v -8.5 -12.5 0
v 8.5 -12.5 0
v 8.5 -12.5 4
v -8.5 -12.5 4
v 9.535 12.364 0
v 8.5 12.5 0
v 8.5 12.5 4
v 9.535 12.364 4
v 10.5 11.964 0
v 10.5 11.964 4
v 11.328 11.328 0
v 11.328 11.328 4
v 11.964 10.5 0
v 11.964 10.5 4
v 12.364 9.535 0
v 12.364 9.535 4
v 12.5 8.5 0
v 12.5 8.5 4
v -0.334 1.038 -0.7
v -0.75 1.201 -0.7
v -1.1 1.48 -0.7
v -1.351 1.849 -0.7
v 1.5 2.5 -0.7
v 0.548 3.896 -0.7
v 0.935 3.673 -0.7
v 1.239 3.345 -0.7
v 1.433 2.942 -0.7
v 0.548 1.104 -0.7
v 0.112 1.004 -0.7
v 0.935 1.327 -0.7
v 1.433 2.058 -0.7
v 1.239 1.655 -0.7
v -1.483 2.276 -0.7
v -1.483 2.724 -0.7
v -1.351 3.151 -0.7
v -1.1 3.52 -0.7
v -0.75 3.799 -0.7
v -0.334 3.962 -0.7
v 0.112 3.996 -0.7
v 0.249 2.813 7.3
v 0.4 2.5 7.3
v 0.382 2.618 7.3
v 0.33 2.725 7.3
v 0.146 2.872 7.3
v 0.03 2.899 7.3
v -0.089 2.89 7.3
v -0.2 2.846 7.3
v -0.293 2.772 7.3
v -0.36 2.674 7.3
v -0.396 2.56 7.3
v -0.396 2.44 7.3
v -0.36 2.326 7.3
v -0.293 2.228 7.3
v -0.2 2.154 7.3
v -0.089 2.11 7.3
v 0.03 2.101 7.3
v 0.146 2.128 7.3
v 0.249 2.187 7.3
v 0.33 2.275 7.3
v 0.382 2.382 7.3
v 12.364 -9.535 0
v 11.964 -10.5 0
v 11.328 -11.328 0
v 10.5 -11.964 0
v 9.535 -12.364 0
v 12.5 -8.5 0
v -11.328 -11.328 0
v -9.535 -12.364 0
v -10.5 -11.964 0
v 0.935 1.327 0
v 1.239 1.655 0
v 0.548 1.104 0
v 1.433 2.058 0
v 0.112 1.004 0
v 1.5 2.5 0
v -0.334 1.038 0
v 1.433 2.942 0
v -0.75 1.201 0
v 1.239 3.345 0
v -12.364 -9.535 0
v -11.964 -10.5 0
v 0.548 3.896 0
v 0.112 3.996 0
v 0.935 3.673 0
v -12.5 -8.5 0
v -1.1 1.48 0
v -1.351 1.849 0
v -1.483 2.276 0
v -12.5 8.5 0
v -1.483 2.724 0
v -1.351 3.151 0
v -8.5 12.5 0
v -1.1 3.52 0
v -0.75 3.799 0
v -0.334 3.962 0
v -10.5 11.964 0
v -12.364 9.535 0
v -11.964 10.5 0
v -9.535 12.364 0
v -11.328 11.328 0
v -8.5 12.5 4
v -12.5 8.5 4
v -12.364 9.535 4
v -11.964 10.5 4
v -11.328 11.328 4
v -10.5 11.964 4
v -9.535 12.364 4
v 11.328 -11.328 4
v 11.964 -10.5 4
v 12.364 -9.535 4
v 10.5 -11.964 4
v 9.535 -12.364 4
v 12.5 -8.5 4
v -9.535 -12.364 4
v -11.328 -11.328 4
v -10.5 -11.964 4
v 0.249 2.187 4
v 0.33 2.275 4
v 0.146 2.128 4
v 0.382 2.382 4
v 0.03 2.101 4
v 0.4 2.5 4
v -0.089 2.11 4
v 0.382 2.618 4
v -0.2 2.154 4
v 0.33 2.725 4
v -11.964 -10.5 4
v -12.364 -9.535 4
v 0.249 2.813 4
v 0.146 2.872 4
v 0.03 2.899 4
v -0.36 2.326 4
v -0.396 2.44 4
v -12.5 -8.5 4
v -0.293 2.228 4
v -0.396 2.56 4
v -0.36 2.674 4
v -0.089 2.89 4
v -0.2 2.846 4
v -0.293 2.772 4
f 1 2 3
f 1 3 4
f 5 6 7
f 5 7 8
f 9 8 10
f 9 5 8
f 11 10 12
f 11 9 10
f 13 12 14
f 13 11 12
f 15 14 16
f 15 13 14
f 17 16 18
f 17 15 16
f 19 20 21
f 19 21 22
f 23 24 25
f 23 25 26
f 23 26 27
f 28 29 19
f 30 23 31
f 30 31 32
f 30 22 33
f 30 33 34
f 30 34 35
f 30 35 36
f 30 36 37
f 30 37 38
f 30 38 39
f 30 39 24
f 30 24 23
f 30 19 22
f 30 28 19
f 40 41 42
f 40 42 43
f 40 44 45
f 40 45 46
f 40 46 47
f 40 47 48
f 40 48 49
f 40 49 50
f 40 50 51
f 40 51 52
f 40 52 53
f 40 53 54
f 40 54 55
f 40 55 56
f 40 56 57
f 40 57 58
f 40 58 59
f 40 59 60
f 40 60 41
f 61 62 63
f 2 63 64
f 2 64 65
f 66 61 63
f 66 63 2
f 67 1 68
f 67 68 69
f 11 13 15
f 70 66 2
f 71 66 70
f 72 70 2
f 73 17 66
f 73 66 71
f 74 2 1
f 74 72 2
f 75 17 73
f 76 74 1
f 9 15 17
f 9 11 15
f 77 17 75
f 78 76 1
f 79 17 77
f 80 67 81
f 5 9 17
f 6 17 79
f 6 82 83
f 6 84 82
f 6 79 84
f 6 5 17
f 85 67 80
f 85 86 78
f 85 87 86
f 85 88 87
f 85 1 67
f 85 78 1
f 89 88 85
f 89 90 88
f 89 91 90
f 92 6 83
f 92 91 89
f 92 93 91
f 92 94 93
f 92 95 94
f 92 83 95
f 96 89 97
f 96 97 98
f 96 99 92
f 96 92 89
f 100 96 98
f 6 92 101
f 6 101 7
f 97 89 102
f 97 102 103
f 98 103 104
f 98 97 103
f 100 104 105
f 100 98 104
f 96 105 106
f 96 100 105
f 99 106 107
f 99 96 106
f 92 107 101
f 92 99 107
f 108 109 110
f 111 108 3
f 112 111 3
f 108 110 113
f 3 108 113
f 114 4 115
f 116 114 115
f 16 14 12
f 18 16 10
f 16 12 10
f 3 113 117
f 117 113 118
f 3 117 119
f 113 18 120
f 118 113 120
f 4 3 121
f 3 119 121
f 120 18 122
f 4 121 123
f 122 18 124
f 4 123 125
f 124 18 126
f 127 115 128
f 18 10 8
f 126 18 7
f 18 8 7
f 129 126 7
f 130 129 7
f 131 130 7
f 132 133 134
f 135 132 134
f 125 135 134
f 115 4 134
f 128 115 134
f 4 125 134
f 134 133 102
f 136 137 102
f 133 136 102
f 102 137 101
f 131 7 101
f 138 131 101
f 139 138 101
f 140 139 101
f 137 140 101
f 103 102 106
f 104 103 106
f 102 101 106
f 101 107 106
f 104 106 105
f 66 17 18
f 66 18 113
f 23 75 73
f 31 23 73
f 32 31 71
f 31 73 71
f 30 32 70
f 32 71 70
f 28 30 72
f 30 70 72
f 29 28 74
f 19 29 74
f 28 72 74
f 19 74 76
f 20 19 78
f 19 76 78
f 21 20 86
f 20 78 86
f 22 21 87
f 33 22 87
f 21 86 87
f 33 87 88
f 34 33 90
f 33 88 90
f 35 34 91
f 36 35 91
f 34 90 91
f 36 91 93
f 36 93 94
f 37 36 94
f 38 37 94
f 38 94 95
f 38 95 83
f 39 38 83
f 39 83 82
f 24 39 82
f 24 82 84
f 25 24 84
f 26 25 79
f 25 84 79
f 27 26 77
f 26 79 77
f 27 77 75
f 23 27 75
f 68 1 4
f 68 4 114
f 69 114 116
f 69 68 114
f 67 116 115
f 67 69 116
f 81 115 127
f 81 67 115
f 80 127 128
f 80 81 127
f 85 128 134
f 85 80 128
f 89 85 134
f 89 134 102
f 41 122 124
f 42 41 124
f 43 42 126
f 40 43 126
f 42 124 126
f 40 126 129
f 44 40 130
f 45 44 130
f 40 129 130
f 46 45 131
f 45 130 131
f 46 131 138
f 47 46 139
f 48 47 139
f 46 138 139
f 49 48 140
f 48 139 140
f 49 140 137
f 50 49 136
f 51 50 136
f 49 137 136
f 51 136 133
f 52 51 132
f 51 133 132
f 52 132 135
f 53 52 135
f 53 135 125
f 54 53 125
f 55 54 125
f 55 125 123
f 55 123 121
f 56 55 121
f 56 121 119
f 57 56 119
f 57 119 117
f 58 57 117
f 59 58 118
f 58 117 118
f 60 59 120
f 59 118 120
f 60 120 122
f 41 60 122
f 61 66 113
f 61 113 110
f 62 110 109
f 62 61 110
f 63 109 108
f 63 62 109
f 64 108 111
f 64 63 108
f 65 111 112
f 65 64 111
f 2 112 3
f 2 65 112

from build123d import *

# Parameters (mm, degrees)
EXTRUDE_1_DEPTH = 4
SKETCH_2_R      = 0.4
EXTRUDE_2_DEPTH = 3.3
SKETCH_3_R      = 1.5
EXTRUDE_3_DEPTH = 0.7


with BuildPart() as part:
    # Эскиз1 → Бобышка-Вытянуть1 (new body)
    with BuildSketch(Plane.XY):
        with BuildLine():
            Line((-8.5, 12.5), (8.5, 12.5))
            ThreePointArc((8.5, 12.5), (11.328427125, 11.328427125), (12.5, 8.5))
            Line((12.5, 8.5), (12.5, -8.5))
            ThreePointArc((12.5, -8.5), (11.328427125, -11.328427125), (8.5, -12.5))
            Line((8.5, -12.5), (-8.5, -12.5))
            ThreePointArc((-8.5, -12.5), (-11.328427125, -11.328427125), (-12.5, -8.5))
            Line((-12.5, -8.5), (-12.5, 8.5))
            ThreePointArc((-12.5, 8.5), (-11.328427125, 11.328427125), (-8.5, 12.5))
        make_face()
    extrude(amount=EXTRUDE_1_DEPTH)

    # Эскиз2 → Бобышка-Вытянуть2 (add)
    with BuildSketch(Plane.XY.offset(4)):
        with Locations((0, 2.5)):
            Circle(SKETCH_2_R)
    extrude(amount=EXTRUDE_2_DEPTH)

    # Эскиз3 → Бобышка-Вытянуть3 (add)
    with BuildSketch(Plane(origin=(0, 0, 0), x_dir=(-1, 0, 0), z_dir=(0, 0, -1))):
        with Locations(Location((0, 2.5, 0), (0, 0, 180))):
            Circle(SKETCH_3_R)
    extrude(amount=EXTRUDE_3_DEPTH)


solid = part.part
